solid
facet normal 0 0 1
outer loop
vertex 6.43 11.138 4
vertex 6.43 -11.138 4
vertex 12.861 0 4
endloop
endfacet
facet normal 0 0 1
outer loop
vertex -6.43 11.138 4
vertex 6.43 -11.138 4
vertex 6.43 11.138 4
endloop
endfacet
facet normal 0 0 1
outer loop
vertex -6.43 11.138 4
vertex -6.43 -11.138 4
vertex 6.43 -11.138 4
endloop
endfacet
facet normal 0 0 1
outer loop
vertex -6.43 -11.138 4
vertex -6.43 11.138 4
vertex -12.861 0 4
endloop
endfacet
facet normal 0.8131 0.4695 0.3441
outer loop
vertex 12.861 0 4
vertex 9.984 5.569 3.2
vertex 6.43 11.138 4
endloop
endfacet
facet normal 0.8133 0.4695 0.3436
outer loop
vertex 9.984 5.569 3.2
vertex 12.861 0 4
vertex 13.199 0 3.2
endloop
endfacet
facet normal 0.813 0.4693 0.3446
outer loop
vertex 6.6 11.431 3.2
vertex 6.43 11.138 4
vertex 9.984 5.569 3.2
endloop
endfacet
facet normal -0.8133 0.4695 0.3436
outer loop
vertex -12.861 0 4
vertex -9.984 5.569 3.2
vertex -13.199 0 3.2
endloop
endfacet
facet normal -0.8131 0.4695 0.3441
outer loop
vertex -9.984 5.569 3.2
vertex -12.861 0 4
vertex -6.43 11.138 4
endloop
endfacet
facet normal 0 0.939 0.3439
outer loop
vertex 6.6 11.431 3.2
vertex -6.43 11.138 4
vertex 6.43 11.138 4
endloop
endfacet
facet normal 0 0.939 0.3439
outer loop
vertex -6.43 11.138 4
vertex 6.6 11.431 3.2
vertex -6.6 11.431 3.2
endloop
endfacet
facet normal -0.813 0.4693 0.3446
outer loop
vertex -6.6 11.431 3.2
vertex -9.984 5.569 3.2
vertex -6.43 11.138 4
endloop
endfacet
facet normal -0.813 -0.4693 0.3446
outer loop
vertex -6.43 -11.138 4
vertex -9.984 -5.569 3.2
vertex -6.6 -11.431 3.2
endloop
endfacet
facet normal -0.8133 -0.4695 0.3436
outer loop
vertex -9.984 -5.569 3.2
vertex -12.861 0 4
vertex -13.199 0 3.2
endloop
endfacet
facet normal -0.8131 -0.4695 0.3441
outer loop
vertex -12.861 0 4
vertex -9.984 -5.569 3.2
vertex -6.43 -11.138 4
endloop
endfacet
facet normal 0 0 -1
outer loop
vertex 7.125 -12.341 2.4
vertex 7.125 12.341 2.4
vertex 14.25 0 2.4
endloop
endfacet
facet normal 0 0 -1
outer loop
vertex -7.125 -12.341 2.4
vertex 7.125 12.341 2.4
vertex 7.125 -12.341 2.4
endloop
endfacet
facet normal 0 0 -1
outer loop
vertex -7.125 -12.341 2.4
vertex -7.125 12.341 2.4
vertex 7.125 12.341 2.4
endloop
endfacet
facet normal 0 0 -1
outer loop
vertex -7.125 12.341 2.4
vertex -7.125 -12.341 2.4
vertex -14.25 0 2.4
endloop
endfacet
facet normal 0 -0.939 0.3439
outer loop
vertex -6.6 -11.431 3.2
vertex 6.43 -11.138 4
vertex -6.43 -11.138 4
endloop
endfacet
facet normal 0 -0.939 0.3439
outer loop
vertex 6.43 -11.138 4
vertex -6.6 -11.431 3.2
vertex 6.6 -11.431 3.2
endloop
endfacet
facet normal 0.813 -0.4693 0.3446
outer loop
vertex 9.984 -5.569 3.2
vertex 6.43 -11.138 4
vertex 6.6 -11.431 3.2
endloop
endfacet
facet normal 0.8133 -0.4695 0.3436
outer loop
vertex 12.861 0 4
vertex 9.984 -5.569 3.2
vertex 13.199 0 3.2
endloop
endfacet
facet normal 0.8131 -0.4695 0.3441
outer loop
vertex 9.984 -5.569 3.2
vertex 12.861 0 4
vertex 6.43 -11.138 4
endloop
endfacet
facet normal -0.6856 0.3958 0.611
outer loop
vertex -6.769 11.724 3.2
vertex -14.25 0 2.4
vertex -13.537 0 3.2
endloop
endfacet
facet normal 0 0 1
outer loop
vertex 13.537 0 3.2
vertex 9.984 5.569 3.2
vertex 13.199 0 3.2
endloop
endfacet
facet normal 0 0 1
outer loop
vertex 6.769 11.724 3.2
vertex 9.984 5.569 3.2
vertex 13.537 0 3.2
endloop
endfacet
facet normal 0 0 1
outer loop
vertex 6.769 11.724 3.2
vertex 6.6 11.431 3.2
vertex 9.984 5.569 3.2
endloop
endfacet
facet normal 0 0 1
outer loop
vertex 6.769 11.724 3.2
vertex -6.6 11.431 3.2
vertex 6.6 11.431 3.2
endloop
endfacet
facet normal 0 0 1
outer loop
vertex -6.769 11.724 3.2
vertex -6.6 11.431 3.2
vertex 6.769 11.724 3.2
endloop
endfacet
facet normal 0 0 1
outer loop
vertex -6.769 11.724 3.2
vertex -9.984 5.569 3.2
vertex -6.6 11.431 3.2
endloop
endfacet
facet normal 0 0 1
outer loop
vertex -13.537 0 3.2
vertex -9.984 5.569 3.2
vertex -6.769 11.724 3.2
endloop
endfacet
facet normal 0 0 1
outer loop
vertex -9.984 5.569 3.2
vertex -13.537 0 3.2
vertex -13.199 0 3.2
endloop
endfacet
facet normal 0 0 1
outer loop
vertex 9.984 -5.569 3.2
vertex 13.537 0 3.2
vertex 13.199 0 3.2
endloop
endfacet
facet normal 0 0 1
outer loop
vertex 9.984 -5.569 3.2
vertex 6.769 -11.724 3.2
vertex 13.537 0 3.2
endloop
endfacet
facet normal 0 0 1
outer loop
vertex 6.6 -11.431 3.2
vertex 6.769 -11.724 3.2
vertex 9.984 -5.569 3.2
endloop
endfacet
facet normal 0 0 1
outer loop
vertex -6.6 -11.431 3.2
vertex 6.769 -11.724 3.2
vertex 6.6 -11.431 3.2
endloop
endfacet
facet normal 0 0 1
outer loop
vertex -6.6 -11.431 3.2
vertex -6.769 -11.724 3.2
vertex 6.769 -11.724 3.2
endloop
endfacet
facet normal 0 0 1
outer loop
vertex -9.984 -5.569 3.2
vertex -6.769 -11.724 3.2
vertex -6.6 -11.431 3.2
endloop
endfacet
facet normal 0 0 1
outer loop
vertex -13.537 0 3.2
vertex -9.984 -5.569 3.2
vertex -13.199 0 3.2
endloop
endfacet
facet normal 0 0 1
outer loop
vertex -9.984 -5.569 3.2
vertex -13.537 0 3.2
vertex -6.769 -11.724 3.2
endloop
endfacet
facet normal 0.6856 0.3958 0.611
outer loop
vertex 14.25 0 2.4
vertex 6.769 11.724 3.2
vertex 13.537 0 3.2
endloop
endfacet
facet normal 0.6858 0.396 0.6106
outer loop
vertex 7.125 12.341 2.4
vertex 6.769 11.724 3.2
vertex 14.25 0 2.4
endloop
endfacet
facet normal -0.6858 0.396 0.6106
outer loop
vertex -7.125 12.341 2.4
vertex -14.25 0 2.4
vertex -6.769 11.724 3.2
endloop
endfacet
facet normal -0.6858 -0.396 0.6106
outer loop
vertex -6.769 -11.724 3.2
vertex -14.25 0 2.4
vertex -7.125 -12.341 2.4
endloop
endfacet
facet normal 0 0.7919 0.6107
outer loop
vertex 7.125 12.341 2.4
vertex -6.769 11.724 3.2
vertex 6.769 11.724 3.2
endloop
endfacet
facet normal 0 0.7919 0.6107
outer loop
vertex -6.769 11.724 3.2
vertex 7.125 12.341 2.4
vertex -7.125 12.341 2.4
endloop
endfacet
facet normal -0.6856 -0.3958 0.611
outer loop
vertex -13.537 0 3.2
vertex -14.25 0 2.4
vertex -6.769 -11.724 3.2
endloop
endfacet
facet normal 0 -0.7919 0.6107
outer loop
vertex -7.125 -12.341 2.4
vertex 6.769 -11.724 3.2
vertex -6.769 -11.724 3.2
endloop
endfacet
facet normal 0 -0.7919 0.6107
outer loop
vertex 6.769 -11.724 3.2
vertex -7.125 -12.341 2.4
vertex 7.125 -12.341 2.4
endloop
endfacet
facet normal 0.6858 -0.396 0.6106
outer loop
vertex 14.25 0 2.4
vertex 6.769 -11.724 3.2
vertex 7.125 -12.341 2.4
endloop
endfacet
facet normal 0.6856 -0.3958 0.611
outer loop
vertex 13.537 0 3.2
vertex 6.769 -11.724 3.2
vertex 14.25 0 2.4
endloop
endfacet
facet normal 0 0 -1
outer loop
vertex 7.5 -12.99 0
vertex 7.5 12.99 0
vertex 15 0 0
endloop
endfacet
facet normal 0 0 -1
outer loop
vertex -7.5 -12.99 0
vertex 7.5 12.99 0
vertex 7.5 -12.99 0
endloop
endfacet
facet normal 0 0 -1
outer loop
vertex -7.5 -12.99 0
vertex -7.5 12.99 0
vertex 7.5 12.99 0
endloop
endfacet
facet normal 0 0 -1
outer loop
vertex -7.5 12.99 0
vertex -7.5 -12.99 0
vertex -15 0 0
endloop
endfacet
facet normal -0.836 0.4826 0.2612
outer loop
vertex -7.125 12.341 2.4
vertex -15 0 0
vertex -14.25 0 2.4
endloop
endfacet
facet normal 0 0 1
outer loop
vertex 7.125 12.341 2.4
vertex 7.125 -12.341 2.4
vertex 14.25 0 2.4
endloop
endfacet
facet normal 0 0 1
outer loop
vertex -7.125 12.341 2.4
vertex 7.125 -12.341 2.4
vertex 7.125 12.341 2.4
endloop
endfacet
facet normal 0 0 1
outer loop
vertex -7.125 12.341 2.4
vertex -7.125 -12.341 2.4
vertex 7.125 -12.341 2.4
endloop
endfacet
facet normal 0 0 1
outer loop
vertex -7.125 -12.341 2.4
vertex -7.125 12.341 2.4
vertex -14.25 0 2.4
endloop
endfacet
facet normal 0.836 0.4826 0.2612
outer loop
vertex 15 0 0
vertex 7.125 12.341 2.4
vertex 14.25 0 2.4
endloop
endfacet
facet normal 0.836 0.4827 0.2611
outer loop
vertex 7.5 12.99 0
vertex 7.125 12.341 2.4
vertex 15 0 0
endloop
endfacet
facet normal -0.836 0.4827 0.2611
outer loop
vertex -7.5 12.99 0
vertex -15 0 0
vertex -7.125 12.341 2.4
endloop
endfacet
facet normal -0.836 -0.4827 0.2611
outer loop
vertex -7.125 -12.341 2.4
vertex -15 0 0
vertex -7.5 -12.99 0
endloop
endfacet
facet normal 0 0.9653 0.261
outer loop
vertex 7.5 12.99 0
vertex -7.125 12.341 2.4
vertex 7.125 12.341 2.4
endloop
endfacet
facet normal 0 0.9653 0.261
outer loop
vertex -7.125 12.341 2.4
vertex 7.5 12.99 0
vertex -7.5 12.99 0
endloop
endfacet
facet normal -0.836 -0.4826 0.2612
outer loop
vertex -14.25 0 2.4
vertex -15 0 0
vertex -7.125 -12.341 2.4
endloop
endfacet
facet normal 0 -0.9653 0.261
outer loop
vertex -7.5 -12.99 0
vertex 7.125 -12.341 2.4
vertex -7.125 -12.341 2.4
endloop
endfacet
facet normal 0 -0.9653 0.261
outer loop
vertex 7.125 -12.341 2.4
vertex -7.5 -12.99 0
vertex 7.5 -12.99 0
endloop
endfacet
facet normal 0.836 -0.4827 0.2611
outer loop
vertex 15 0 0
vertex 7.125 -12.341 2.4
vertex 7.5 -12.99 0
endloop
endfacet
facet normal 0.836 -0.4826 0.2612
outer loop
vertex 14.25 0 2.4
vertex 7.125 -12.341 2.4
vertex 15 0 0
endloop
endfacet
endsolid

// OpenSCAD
// file: ../build.scad
$build_id = "";

function building(filename) = is_undef(filename) ?
  !is_undef(build)
  : !is_undef(build) && build == filename;

function previewing() = !building();

module build(filename) {
  $build_id = filename;

  if(!is_undef(scad_build_scan) && scad_build_scan == true) {
    echo(str("scad_build_scan: ", filename));
  }
  else if(previewing() || build == filename) {
    children();
  }
}

module preview_row(spacing) {
  if(previewing()) {
    for(x = [0:1:$children - 1]) {
      translate([x * spacing, 0, 0]) {
        children(x);
      }
    }
  }
  else {
    children();
  }
}

module preview_column(spacing) {
  if(previewing()) {
    for(y = [0:1:$children - 1]) {
      translate([0, y * spacing, 0]) {
        children(y);
      }
    }
  }
  else {
    children();
  }
}
// file: ../minibase.scad
// Based off of titancraft's Customizable Miniature Base (CC0 1.0)
// https://www.thingiverse.com/thing:1112237

include <./build.scad>

$base_rim = 1; //	[1: tapered, 2: inclined, 3: flat]
// Number of sides:
$base_shape = 100; //	[30:Low-res Circle, 100: Hi-res Circle, 5:Pentagon, 6:Hexagon, 8:Octagon, 4:Square, 3:Triangle]

$base_diameter = 32;
$base_height = 4;
$base_slant = 95;

// Percentage:
$base_stretch = 100;

//(tapered base only)
$base_inner_circle_ratio = 40;

module tapered(r=40) {
  $base_rim = 1;
  $base_inner_circle_ratio = r;

  children();
}

module inclined() {
  $base_rim = 2;

  children();
}

module flat() {
  $base_rim = 3;

  children();
}

module shape(s) {
  $base_shape = s;

  children();
}

module diameter(d) {
  $base_diameter = d;

  children();
}

module height(h) {
  $base_height = h;

  children();
}

module slant(s) {
  $base_slant = s;

  children();
}

module stretch(s) {
  $base_stretch = s;

  children();
}

module base(id) {
  build(id) union() {
    radius = $base_diameter/2;
    scale([$base_stretch/100, 1, 1]){
      if ($base_rim == 1){
        // tapered base
        cyl1_height = $base_height * (1-$base_inner_circle_ratio/100);
        cylinder(cyl1_height, radius, radius * $base_slant/100, $fn=$base_shape);

        cyl2_radius = radius  * $base_slant/100 * .95;
        cyl2_height = $base_height - cyl1_height;

        translate([0, 0, cyl1_height]){
          cylinder(cyl2_height, cyl2_radius, cyl2_radius * $base_slant/100, $fn=$base_shape);
          cylinder(cyl2_height*.5, radius * $base_slant/100, cyl2_radius, $fn=$base_shape);
        }
      } else if ($base_rim == 2){
        // inclined base
        cylinder($base_height, radius, radius * $base_slant/100, $fn=$base_shape);
      } else if ($base_rim == 3){
        // flat base

        cylinder($base_height, radius, radius, $fn=$base_shape);
      }
    }
  }
}
// main file
include <../minibase.scad>

tapered() diameter(30) shape(6) base("30mm-battletech-hex");
